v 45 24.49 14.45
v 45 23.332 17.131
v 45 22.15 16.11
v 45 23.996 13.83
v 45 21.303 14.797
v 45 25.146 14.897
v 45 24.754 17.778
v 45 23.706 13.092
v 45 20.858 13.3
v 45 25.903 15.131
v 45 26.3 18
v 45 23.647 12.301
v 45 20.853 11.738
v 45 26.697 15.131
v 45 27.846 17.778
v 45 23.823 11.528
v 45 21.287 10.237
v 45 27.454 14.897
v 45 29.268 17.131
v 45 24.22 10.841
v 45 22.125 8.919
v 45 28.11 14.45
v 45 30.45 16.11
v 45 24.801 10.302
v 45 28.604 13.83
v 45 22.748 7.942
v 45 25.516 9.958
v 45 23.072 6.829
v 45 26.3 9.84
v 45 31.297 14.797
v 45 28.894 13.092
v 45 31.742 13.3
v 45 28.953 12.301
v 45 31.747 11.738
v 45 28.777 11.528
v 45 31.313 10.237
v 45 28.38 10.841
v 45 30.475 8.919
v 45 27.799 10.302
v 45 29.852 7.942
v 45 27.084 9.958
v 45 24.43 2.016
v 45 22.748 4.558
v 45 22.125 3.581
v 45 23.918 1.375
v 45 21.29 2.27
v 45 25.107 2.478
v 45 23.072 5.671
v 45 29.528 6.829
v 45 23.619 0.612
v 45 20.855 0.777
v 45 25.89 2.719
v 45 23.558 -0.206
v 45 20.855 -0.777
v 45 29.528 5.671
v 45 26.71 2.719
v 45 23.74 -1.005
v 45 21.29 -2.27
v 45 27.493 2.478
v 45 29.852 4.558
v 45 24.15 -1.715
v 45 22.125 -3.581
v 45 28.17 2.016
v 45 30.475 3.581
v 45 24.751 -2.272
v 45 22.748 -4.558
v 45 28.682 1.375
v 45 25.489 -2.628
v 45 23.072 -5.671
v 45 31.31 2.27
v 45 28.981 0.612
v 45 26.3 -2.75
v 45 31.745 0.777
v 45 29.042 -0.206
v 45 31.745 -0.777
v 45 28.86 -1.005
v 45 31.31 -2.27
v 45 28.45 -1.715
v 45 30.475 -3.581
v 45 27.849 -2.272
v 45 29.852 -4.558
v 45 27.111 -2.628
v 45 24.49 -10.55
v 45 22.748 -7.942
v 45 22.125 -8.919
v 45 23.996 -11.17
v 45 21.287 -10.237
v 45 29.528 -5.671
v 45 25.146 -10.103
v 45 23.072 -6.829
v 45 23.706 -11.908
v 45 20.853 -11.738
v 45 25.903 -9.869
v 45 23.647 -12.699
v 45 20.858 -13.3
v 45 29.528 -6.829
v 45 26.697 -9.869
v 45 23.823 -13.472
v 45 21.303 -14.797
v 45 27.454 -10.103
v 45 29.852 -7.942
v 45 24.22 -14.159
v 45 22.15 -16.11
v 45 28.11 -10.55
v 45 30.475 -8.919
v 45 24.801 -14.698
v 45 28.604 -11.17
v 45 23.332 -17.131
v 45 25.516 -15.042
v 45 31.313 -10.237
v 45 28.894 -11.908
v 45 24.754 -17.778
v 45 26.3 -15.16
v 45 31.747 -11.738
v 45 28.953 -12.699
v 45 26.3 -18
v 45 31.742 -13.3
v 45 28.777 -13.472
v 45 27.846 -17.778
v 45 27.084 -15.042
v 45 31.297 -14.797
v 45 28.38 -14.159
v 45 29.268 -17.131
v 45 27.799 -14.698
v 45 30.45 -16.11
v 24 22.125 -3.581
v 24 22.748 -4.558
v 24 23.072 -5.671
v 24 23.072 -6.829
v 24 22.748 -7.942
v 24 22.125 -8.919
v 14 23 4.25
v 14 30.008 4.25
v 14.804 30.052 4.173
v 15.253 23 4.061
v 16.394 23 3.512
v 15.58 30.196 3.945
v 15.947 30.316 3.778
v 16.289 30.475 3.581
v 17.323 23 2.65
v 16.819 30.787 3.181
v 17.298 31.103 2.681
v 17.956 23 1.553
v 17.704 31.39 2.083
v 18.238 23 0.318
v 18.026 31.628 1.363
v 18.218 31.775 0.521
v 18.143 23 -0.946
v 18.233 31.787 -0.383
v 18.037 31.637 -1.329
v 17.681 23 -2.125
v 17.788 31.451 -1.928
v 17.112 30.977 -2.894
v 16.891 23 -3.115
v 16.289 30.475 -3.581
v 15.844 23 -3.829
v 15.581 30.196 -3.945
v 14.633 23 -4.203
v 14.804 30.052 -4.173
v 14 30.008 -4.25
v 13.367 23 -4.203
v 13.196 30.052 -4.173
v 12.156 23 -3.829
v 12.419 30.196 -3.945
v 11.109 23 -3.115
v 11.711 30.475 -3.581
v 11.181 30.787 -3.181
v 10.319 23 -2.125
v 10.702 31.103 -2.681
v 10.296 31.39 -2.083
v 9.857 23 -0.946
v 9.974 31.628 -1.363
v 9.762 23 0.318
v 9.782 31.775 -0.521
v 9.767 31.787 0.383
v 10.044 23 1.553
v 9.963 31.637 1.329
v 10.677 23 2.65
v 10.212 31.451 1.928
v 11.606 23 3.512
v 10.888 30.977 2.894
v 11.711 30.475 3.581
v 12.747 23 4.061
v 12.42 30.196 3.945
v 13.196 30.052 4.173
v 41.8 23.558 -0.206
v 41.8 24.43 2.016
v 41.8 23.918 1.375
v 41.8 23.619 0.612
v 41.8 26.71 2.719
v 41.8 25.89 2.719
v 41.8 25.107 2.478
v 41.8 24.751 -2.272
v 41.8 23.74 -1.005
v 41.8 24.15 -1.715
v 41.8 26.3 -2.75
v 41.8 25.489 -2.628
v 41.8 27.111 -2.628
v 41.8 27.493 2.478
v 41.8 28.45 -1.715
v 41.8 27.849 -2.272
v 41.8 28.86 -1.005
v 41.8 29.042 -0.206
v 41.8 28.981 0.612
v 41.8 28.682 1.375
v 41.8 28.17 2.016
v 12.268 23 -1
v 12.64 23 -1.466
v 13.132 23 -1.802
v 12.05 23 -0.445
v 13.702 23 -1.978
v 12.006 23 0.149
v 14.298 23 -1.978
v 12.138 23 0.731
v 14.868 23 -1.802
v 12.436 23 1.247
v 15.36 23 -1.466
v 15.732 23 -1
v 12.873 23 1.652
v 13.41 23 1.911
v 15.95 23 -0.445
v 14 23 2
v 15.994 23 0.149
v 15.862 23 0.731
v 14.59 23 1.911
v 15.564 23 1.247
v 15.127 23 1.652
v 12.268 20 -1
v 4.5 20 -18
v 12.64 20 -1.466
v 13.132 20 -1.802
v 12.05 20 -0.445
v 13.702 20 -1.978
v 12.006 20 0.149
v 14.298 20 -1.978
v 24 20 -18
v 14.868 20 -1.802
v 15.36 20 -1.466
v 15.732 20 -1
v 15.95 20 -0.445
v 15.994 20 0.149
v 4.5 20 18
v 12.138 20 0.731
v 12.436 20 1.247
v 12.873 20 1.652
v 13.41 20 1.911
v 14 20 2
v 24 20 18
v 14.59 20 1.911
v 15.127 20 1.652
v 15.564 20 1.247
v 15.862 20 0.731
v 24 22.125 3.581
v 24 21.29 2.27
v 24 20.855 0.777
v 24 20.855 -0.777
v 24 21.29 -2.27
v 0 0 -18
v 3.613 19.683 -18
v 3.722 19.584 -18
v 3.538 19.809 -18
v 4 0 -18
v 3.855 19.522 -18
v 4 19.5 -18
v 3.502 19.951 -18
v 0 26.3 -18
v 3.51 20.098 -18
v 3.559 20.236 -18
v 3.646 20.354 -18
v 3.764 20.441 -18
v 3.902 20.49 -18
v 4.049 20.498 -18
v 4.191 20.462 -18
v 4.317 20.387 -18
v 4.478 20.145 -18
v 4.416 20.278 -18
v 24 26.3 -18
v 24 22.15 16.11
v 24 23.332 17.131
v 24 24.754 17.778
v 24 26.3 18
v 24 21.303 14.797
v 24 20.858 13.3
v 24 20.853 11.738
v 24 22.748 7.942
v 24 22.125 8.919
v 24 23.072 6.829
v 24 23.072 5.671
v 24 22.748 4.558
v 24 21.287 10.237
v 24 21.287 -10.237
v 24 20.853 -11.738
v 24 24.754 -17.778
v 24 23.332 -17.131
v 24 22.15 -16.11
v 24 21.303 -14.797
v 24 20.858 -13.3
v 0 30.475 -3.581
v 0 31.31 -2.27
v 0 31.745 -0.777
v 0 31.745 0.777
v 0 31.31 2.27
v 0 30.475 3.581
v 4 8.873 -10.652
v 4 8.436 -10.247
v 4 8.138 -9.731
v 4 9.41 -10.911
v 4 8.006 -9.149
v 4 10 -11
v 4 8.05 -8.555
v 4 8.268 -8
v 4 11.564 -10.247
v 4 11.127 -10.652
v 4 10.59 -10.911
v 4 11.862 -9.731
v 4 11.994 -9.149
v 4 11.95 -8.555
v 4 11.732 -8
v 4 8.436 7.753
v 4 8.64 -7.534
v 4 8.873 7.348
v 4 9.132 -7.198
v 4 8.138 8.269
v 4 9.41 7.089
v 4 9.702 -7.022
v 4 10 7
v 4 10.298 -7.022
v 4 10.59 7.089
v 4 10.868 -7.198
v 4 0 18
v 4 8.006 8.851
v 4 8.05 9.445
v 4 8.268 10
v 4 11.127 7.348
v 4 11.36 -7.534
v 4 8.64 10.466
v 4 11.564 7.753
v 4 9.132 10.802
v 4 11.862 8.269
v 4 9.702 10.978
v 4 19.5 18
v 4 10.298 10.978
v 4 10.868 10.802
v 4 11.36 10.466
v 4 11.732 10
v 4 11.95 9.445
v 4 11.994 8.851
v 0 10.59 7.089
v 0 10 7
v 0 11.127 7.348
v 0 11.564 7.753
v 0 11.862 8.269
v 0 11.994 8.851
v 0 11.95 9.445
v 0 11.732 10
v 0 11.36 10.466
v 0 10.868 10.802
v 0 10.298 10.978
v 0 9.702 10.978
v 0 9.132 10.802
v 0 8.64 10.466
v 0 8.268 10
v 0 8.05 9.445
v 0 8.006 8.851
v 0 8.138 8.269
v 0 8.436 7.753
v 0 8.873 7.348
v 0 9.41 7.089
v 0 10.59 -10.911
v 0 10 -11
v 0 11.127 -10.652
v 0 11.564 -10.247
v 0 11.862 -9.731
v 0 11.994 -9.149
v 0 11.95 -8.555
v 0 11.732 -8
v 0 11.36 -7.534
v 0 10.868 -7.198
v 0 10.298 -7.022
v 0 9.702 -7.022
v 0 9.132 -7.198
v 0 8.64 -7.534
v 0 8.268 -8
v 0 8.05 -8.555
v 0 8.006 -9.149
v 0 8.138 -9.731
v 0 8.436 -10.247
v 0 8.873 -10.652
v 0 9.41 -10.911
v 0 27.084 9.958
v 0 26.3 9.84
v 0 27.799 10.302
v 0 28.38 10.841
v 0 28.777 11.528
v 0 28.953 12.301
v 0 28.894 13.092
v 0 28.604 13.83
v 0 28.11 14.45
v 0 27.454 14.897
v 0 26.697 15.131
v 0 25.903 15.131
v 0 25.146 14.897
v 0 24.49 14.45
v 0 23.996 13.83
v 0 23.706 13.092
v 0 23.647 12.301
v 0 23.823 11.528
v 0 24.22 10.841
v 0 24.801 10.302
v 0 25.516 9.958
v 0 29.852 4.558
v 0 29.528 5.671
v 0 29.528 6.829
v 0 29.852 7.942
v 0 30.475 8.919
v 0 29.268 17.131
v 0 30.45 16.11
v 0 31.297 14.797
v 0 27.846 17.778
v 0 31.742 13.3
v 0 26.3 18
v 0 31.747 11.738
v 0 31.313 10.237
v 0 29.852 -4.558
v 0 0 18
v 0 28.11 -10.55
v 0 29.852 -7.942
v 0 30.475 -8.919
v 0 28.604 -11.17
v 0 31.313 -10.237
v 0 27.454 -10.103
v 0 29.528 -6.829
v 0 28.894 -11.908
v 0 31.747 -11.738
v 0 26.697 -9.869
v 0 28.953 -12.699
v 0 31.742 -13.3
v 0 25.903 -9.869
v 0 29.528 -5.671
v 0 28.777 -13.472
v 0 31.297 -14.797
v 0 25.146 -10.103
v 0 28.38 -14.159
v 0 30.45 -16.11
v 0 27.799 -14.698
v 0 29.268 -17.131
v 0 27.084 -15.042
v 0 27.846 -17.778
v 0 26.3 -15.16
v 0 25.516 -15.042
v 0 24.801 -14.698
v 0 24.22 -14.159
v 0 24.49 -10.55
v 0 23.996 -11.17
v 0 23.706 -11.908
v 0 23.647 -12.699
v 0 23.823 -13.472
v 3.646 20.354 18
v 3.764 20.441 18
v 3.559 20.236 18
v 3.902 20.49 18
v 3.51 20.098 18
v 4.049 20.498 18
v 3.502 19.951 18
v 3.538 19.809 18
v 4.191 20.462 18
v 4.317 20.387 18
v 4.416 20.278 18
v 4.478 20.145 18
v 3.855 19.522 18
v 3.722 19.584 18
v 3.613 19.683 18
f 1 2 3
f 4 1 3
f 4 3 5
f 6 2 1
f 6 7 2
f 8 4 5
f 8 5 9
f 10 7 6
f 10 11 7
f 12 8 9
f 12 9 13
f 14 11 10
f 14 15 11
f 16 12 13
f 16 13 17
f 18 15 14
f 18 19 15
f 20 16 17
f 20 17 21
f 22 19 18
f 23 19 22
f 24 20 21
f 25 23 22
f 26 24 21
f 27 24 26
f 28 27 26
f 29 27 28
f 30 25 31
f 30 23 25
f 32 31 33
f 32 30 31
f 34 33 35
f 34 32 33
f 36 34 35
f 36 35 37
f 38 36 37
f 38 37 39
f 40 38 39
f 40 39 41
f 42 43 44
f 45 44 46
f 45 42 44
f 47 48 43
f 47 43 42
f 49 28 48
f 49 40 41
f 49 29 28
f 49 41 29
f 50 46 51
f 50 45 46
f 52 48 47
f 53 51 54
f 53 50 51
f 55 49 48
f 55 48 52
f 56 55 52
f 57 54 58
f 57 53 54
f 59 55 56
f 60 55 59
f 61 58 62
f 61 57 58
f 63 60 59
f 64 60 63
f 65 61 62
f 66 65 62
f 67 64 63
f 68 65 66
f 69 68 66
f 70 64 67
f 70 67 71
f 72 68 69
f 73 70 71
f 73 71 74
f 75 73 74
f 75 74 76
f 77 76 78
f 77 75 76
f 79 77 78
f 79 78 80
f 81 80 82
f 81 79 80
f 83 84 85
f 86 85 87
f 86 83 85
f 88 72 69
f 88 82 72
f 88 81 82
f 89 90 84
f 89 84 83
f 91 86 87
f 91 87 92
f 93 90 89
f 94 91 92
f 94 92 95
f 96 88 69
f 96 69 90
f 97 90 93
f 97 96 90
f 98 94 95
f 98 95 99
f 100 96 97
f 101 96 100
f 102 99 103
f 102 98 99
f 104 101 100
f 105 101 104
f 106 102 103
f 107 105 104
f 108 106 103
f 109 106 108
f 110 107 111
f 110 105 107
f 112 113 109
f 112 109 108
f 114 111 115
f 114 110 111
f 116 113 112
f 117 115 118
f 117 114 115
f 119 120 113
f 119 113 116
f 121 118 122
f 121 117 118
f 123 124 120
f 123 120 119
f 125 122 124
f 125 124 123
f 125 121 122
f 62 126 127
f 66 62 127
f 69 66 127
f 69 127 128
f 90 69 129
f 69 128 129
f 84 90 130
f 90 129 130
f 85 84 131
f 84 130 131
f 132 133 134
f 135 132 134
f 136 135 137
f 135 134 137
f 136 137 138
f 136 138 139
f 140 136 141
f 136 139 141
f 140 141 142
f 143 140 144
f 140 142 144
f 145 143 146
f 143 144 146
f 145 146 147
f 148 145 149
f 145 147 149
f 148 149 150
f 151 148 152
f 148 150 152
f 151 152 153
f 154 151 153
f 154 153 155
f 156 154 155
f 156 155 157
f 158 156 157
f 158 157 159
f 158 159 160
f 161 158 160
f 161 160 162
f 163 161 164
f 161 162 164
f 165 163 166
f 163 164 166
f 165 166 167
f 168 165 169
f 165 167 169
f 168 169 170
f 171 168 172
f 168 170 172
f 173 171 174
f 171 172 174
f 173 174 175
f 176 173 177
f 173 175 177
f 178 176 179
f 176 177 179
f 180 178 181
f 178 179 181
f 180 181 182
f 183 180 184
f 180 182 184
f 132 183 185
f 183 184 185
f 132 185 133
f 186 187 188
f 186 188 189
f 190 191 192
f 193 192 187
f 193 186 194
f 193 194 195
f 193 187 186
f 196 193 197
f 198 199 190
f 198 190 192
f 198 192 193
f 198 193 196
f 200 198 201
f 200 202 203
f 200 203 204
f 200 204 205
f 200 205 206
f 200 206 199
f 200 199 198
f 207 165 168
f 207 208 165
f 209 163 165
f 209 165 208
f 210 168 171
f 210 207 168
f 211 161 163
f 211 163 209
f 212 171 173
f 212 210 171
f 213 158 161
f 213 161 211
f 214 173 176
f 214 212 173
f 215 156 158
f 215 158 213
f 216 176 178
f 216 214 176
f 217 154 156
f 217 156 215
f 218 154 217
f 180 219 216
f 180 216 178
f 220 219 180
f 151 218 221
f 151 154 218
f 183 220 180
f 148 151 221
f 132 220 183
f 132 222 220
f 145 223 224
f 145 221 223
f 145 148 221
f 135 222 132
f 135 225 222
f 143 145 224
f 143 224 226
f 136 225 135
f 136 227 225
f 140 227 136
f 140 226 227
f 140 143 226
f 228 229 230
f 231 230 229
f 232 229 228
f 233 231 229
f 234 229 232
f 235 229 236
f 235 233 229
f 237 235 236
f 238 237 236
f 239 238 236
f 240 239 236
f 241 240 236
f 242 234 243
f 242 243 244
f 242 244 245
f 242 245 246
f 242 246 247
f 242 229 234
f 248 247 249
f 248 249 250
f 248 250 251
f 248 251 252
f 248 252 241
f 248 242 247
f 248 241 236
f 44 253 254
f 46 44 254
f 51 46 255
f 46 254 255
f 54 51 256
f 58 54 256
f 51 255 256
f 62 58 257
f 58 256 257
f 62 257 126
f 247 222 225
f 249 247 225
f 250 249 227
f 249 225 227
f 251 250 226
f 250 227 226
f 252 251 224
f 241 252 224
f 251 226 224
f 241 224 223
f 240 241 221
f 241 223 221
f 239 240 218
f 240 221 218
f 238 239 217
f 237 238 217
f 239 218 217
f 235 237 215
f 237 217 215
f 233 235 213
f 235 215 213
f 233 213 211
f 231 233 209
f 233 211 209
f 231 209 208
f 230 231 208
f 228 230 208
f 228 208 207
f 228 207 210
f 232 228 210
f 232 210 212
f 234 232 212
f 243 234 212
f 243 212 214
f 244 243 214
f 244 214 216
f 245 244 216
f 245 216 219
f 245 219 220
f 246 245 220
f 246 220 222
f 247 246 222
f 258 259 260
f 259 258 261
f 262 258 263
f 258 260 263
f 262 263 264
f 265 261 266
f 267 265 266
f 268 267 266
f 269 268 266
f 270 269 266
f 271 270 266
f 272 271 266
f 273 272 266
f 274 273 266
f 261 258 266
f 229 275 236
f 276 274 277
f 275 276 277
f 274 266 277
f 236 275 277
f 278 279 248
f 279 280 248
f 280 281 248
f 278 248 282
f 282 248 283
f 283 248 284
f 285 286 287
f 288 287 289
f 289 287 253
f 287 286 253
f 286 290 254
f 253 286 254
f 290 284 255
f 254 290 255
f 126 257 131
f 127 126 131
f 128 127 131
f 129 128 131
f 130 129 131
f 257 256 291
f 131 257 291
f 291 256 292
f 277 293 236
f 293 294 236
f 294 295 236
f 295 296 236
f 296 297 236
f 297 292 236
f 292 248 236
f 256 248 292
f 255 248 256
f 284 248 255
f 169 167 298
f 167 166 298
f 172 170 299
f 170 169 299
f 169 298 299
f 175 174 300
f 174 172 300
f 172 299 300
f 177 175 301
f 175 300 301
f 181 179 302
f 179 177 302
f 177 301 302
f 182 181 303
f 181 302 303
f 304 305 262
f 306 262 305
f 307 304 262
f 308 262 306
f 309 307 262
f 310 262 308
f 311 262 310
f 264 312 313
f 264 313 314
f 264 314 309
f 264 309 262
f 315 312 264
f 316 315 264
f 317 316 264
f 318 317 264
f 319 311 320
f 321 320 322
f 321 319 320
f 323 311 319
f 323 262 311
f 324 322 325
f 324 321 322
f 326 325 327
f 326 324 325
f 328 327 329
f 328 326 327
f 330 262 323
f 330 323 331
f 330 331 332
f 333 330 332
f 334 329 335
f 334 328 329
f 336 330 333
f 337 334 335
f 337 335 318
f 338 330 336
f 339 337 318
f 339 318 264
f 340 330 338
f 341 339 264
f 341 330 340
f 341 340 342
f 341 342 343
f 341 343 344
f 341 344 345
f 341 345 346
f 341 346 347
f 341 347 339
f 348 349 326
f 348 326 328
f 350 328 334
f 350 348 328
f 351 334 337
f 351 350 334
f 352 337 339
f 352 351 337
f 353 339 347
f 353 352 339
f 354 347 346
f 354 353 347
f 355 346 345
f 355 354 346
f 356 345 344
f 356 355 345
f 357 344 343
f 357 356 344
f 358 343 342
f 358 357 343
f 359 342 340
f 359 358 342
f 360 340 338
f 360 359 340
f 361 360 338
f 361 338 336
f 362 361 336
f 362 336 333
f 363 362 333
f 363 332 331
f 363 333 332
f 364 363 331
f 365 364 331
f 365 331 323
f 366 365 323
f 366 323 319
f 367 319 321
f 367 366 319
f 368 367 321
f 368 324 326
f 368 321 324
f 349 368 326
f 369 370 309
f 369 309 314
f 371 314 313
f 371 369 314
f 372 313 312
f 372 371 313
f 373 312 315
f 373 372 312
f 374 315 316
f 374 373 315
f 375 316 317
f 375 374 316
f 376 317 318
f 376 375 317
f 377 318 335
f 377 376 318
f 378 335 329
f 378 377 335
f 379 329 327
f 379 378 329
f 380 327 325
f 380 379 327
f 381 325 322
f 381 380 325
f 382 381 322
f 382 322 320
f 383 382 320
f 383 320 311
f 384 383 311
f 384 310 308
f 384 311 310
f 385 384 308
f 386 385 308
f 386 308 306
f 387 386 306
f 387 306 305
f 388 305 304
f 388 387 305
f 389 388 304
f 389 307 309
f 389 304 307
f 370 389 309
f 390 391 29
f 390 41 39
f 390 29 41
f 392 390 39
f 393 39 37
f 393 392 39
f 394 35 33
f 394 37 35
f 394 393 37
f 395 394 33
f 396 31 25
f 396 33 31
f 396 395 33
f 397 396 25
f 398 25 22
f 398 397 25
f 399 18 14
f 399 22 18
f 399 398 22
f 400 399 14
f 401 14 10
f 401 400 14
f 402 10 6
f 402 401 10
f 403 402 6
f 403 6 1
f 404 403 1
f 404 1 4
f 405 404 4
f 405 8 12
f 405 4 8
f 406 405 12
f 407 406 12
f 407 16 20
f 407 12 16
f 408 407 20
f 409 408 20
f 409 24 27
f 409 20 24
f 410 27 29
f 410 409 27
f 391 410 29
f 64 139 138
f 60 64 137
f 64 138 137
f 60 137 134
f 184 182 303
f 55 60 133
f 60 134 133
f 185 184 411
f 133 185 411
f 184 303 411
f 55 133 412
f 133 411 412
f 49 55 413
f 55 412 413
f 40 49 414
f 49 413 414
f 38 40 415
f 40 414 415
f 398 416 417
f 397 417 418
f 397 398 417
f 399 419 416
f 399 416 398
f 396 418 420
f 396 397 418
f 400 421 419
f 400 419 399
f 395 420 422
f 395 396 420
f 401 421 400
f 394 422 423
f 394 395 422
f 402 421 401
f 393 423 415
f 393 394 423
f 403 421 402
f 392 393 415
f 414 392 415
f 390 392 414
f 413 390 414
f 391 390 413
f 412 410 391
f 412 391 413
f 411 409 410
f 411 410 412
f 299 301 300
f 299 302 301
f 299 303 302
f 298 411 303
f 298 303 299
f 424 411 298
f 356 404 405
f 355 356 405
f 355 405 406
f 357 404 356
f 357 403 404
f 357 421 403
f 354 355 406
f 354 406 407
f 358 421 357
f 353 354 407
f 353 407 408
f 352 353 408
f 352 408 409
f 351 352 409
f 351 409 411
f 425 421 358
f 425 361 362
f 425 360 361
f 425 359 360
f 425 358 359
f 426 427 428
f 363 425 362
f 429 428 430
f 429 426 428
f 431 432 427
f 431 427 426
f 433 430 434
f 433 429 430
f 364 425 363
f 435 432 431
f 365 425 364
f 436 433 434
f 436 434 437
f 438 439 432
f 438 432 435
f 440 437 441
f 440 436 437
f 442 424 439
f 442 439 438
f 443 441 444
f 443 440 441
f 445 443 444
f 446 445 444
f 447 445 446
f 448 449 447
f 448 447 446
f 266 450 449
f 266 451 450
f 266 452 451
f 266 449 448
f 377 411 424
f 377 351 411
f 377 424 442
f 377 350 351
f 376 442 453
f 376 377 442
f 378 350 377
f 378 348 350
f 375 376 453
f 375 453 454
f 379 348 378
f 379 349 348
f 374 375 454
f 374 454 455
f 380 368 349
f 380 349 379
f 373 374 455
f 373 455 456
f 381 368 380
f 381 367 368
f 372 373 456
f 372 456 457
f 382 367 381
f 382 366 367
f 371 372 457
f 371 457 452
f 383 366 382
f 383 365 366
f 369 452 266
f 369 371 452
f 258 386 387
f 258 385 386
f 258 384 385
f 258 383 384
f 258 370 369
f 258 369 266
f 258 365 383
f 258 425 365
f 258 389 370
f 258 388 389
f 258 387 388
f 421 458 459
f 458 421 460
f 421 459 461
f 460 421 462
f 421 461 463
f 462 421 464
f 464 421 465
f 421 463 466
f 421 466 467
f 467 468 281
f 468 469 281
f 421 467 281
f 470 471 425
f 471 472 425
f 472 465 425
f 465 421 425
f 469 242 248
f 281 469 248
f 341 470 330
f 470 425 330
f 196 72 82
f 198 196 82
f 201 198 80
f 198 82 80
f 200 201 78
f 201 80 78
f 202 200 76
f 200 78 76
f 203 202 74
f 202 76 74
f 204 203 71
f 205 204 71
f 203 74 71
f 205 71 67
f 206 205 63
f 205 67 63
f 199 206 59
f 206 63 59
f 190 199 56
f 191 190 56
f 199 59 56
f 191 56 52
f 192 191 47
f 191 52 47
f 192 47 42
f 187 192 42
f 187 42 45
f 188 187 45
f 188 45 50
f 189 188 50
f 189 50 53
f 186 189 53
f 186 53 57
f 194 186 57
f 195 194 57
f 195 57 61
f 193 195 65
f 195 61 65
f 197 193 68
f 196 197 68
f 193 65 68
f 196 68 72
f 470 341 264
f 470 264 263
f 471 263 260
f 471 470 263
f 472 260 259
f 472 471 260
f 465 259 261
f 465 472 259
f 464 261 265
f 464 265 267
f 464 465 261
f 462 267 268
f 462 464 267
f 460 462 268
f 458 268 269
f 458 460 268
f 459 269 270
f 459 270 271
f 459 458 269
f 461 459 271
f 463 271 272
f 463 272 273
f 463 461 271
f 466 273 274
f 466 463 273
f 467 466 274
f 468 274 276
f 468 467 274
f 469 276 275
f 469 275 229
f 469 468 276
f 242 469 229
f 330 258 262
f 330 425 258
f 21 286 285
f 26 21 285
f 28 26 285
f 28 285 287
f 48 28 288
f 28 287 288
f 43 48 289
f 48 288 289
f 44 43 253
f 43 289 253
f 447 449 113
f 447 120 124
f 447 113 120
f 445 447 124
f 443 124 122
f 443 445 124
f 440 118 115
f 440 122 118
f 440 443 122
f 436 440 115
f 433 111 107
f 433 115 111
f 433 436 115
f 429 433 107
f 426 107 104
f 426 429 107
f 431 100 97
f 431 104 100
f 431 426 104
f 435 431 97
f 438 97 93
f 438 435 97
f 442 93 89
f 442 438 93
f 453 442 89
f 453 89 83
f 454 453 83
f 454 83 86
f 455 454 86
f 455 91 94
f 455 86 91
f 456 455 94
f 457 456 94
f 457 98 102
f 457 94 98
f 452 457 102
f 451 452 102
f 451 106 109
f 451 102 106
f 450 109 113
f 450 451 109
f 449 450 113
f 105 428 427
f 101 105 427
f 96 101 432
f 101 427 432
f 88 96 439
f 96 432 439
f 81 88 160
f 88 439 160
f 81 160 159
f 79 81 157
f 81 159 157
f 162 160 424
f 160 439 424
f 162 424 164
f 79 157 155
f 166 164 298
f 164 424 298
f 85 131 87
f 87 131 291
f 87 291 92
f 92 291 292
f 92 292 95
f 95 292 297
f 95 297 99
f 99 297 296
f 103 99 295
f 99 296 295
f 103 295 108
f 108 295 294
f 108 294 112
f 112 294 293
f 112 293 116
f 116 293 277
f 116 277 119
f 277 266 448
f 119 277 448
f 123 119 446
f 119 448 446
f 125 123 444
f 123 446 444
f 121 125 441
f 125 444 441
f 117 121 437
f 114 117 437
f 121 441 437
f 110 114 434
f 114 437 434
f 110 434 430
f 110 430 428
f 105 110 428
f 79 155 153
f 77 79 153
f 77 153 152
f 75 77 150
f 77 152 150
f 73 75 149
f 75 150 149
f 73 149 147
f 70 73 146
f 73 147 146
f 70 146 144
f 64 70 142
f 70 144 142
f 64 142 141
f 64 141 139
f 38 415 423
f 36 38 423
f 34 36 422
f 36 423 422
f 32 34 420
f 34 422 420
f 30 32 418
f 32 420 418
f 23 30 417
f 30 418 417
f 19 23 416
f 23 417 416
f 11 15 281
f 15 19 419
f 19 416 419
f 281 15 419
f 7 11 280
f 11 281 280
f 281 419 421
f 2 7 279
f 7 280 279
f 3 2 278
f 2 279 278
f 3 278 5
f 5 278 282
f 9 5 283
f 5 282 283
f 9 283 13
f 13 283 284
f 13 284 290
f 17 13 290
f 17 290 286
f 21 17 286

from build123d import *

# Parameters (mm, degrees)
BOSS_EXTRUDE1_DEPTH             = 18
BOSS_EXTRUDE2_REACH             = 40.419
BOSS_EXTRUDE2_DIRECTION_2_DEPTH = 21
SKETCH10_W                      = 24
SKETCH10_H                      = 36
BOSS_EXTRUDE4_DEPTH             = 2.3
CUT_EXTRUDE1_DEPTH              = 58.967577144
CUT_EXTRUDE1_DEPTH_BACK         = 58.967577144
SKETCH4_R                       = 2.6605
SKETCH4_3_R                     = 2.75
CUT_EXTRUDE2_DEPTH              = 3.2
CUT_EXTRUDE3_DEPTH              = 55.920305899
CUT_EXTRUDE3_DEPTH_BACK         = 55.920305899
SKETCH6_R                       = 2
SKETCH8_R                       = 2
CUT_EXTRUDE4_DEPTH              = 58.967577144
SKETCH8_3_R                     = 4.25
SKETCH8_3_R_2                   = 2
CUT_EXTRUDE5_DEPTH              = 8.8


with BuildPart() as part:
    # Sketch1 → Boss-Extrude1 (new, symmetric)
    with BuildSketch(Plane.XY):
        with BuildLine():
            Line((0, 0), (4, 0))
            Line((4, 0), (4, 19.5))
            ThreePointArc((4, 19.5), (3.646446609, 20.353553391), (4.5, 20))
            Line((4.5, 20), (24, 20))
            Line((24, 20), (24, 24))
            Line((24, 24), (0, 24))
            Line((0, 24), (0, 0))
        make_face()
    extrude(amount=BOSS_EXTRUDE1_DEPTH, both=True)

    # Boss-Extrude2: up to this face of the body (flat: up to its plane)
    boss_extrude2_end = Plane(part.part.faces().sort_by_distance((0, 12, 0))[0])
    # Sketch3 → Boss-Extrude2 (add, up to the picked face)
    with BuildSketch(Plane.ZY.offset(-24), mode=Mode.PRIVATE) as boss_extrude2_sk1:
        with BuildLine():
            ThreePointArc((8.919270833, 22.125269034), (6.25, 23.11319686), (3.580729167, 22.125269034))
            ThreePointArc((3.580729167, 22.125269034), (0, 20.8), (-3.580729167, 22.125269034))
            ThreePointArc((-3.580729167, 22.125269034), (-6.25, 23.11319686), (-8.919270833, 22.125269034))
            ThreePointArc((-8.919270833, 22.125269034), (-18, 26.3), (-8.919270833, 30.474730966))
            ThreePointArc((-8.919270833, 30.474730966), (-6.25, 29.48680314), (-3.580729167, 30.474730966))
            ThreePointArc((-3.580729167, 30.474730966), (0, 31.8), (3.580729167, 30.474730966))
            ThreePointArc((3.580729167, 30.474730966), (6.25, 29.48680314), (8.919270833, 30.474730966))
            ThreePointArc((8.919270833, 30.474730966), (18, 26.3), (8.919270833, 22.125269034))
        make_face()
    boss_extrude2_tool1 = split(extrude(boss_extrude2_sk1.sketch, amount=BOSS_EXTRUDE2_REACH, mode=Mode.PRIVATE), bisect_by=boss_extrude2_end, keep=Keep.BOTH, mode=Mode.PRIVATE)
    add(boss_extrude2_tool1.solids().sort_by(Axis((24, 26.3, 0), (-1, 0, 0)))[0])

    # Sketch3 → Boss-Extrude2 direction 2 (add)
    with BuildSketch(Plane.ZY.offset(-24)):
        with BuildLine():
            ThreePointArc((8.919270833, 22.125269034), (6.25, 23.11319686), (3.580729167, 22.125269034))
            ThreePointArc((3.580729167, 22.125269034), (0, 20.8), (-3.580729167, 22.125269034))
            ThreePointArc((-3.580729167, 22.125269034), (-6.25, 23.11319686), (-8.919270833, 22.125269034))
            ThreePointArc((-8.919270833, 22.125269034), (-18, 26.3), (-8.919270833, 30.474730966))
            ThreePointArc((-8.919270833, 30.474730966), (-6.25, 29.48680314), (-3.580729167, 30.474730966))
            ThreePointArc((-3.580729167, 30.474730966), (0, 31.8), (3.580729167, 30.474730966))
            ThreePointArc((3.580729167, 30.474730966), (6.25, 29.48680314), (8.919270833, 30.474730966))
            ThreePointArc((8.919270833, 30.474730966), (18, 26.3), (8.919270833, 22.125269034))
        make_face()
    extrude(amount=-BOSS_EXTRUDE2_DIRECTION_2_DEPTH)

    # Sketch10 → Boss-Extrude4 (add)
    with BuildSketch(Plane(origin=(0, 24, 0), x_dir=(1, 0, 0), z_dir=(0, 1, 0))):
        with Locations((12, 0)):
            Rectangle(SKETCH10_W, SKETCH10_H)
    extrude(amount=BOSS_EXTRUDE4_DEPTH)

    # Sketch4 → Cut-Extrude1 (cut, two sides: drawn at the far end of the back side and taken through both)
    with BuildSketch(Plane(origin=(45, 0, 0), x_dir=(0, 0, -1), z_dir=(1, 0, 0)).offset(-CUT_EXTRUDE1_DEPTH_BACK)):
        with Locations((-12.5, 26.3)):
            Circle(SKETCH4_R)
        with Locations((12.5, 26.3)):
            Circle(SKETCH4_R)
    extrude(amount=CUT_EXTRUDE1_DEPTH + CUT_EXTRUDE1_DEPTH_BACK, mode=Mode.SUBTRACT)

    # Sketch4<3> → Cut-Extrude2 (cut)
    with BuildSketch(Plane(origin=(45, 0, 0), x_dir=(0, 0, -1), z_dir=(1, 0, 0))):
        with Locations((0, 26.3)):
            Circle(SKETCH4_3_R)
    extrude(amount=-CUT_EXTRUDE2_DEPTH, mode=Mode.SUBTRACT)

    # Sketch6 → Cut-Extrude3 (cut, two sides: drawn at the far end of the back side and taken through both)
    with BuildSketch(Plane(origin=(4, 0, 0), x_dir=(0, 0, -1), z_dir=(1, 0, 0)).offset(-CUT_EXTRUDE3_DEPTH_BACK)):
        with Locations((-9, 10)):
            Circle(SKETCH6_R)
        with Locations((9, 10)):
            Circle(SKETCH6_R)
    extrude(amount=CUT_EXTRUDE3_DEPTH + CUT_EXTRUDE3_DEPTH_BACK, mode=Mode.SUBTRACT)

    # Sketch8 → Cut-Extrude4 (cut, through all)
    with BuildSketch(Plane(origin=(0, 31.8, 0), x_dir=(1, 0, 0), z_dir=(0, 1, 0))):
        with Locations(Location((14, 0, 0), (0, 0, 270))):
            Circle(SKETCH8_R)
    extrude(amount=-CUT_EXTRUDE4_DEPTH, mode=Mode.SUBTRACT)

    # Sketch8<3> → Cut-Extrude5 (cut)
    with BuildSketch(Plane(origin=(0, 31.8, 0), x_dir=(1, 0, 0), z_dir=(0, 1, 0))):
        with Locations(Location((14, 0, 0), (0, 0, 270))):
            Circle(SKETCH8_3_R)
        with Locations(Location((14, 0, 0), (0, 0, 270))):
            Circle(SKETCH8_3_R_2, mode=Mode.SUBTRACT)
    extrude(amount=-CUT_EXTRUDE5_DEPTH, mode=Mode.SUBTRACT)


solid = part.part
